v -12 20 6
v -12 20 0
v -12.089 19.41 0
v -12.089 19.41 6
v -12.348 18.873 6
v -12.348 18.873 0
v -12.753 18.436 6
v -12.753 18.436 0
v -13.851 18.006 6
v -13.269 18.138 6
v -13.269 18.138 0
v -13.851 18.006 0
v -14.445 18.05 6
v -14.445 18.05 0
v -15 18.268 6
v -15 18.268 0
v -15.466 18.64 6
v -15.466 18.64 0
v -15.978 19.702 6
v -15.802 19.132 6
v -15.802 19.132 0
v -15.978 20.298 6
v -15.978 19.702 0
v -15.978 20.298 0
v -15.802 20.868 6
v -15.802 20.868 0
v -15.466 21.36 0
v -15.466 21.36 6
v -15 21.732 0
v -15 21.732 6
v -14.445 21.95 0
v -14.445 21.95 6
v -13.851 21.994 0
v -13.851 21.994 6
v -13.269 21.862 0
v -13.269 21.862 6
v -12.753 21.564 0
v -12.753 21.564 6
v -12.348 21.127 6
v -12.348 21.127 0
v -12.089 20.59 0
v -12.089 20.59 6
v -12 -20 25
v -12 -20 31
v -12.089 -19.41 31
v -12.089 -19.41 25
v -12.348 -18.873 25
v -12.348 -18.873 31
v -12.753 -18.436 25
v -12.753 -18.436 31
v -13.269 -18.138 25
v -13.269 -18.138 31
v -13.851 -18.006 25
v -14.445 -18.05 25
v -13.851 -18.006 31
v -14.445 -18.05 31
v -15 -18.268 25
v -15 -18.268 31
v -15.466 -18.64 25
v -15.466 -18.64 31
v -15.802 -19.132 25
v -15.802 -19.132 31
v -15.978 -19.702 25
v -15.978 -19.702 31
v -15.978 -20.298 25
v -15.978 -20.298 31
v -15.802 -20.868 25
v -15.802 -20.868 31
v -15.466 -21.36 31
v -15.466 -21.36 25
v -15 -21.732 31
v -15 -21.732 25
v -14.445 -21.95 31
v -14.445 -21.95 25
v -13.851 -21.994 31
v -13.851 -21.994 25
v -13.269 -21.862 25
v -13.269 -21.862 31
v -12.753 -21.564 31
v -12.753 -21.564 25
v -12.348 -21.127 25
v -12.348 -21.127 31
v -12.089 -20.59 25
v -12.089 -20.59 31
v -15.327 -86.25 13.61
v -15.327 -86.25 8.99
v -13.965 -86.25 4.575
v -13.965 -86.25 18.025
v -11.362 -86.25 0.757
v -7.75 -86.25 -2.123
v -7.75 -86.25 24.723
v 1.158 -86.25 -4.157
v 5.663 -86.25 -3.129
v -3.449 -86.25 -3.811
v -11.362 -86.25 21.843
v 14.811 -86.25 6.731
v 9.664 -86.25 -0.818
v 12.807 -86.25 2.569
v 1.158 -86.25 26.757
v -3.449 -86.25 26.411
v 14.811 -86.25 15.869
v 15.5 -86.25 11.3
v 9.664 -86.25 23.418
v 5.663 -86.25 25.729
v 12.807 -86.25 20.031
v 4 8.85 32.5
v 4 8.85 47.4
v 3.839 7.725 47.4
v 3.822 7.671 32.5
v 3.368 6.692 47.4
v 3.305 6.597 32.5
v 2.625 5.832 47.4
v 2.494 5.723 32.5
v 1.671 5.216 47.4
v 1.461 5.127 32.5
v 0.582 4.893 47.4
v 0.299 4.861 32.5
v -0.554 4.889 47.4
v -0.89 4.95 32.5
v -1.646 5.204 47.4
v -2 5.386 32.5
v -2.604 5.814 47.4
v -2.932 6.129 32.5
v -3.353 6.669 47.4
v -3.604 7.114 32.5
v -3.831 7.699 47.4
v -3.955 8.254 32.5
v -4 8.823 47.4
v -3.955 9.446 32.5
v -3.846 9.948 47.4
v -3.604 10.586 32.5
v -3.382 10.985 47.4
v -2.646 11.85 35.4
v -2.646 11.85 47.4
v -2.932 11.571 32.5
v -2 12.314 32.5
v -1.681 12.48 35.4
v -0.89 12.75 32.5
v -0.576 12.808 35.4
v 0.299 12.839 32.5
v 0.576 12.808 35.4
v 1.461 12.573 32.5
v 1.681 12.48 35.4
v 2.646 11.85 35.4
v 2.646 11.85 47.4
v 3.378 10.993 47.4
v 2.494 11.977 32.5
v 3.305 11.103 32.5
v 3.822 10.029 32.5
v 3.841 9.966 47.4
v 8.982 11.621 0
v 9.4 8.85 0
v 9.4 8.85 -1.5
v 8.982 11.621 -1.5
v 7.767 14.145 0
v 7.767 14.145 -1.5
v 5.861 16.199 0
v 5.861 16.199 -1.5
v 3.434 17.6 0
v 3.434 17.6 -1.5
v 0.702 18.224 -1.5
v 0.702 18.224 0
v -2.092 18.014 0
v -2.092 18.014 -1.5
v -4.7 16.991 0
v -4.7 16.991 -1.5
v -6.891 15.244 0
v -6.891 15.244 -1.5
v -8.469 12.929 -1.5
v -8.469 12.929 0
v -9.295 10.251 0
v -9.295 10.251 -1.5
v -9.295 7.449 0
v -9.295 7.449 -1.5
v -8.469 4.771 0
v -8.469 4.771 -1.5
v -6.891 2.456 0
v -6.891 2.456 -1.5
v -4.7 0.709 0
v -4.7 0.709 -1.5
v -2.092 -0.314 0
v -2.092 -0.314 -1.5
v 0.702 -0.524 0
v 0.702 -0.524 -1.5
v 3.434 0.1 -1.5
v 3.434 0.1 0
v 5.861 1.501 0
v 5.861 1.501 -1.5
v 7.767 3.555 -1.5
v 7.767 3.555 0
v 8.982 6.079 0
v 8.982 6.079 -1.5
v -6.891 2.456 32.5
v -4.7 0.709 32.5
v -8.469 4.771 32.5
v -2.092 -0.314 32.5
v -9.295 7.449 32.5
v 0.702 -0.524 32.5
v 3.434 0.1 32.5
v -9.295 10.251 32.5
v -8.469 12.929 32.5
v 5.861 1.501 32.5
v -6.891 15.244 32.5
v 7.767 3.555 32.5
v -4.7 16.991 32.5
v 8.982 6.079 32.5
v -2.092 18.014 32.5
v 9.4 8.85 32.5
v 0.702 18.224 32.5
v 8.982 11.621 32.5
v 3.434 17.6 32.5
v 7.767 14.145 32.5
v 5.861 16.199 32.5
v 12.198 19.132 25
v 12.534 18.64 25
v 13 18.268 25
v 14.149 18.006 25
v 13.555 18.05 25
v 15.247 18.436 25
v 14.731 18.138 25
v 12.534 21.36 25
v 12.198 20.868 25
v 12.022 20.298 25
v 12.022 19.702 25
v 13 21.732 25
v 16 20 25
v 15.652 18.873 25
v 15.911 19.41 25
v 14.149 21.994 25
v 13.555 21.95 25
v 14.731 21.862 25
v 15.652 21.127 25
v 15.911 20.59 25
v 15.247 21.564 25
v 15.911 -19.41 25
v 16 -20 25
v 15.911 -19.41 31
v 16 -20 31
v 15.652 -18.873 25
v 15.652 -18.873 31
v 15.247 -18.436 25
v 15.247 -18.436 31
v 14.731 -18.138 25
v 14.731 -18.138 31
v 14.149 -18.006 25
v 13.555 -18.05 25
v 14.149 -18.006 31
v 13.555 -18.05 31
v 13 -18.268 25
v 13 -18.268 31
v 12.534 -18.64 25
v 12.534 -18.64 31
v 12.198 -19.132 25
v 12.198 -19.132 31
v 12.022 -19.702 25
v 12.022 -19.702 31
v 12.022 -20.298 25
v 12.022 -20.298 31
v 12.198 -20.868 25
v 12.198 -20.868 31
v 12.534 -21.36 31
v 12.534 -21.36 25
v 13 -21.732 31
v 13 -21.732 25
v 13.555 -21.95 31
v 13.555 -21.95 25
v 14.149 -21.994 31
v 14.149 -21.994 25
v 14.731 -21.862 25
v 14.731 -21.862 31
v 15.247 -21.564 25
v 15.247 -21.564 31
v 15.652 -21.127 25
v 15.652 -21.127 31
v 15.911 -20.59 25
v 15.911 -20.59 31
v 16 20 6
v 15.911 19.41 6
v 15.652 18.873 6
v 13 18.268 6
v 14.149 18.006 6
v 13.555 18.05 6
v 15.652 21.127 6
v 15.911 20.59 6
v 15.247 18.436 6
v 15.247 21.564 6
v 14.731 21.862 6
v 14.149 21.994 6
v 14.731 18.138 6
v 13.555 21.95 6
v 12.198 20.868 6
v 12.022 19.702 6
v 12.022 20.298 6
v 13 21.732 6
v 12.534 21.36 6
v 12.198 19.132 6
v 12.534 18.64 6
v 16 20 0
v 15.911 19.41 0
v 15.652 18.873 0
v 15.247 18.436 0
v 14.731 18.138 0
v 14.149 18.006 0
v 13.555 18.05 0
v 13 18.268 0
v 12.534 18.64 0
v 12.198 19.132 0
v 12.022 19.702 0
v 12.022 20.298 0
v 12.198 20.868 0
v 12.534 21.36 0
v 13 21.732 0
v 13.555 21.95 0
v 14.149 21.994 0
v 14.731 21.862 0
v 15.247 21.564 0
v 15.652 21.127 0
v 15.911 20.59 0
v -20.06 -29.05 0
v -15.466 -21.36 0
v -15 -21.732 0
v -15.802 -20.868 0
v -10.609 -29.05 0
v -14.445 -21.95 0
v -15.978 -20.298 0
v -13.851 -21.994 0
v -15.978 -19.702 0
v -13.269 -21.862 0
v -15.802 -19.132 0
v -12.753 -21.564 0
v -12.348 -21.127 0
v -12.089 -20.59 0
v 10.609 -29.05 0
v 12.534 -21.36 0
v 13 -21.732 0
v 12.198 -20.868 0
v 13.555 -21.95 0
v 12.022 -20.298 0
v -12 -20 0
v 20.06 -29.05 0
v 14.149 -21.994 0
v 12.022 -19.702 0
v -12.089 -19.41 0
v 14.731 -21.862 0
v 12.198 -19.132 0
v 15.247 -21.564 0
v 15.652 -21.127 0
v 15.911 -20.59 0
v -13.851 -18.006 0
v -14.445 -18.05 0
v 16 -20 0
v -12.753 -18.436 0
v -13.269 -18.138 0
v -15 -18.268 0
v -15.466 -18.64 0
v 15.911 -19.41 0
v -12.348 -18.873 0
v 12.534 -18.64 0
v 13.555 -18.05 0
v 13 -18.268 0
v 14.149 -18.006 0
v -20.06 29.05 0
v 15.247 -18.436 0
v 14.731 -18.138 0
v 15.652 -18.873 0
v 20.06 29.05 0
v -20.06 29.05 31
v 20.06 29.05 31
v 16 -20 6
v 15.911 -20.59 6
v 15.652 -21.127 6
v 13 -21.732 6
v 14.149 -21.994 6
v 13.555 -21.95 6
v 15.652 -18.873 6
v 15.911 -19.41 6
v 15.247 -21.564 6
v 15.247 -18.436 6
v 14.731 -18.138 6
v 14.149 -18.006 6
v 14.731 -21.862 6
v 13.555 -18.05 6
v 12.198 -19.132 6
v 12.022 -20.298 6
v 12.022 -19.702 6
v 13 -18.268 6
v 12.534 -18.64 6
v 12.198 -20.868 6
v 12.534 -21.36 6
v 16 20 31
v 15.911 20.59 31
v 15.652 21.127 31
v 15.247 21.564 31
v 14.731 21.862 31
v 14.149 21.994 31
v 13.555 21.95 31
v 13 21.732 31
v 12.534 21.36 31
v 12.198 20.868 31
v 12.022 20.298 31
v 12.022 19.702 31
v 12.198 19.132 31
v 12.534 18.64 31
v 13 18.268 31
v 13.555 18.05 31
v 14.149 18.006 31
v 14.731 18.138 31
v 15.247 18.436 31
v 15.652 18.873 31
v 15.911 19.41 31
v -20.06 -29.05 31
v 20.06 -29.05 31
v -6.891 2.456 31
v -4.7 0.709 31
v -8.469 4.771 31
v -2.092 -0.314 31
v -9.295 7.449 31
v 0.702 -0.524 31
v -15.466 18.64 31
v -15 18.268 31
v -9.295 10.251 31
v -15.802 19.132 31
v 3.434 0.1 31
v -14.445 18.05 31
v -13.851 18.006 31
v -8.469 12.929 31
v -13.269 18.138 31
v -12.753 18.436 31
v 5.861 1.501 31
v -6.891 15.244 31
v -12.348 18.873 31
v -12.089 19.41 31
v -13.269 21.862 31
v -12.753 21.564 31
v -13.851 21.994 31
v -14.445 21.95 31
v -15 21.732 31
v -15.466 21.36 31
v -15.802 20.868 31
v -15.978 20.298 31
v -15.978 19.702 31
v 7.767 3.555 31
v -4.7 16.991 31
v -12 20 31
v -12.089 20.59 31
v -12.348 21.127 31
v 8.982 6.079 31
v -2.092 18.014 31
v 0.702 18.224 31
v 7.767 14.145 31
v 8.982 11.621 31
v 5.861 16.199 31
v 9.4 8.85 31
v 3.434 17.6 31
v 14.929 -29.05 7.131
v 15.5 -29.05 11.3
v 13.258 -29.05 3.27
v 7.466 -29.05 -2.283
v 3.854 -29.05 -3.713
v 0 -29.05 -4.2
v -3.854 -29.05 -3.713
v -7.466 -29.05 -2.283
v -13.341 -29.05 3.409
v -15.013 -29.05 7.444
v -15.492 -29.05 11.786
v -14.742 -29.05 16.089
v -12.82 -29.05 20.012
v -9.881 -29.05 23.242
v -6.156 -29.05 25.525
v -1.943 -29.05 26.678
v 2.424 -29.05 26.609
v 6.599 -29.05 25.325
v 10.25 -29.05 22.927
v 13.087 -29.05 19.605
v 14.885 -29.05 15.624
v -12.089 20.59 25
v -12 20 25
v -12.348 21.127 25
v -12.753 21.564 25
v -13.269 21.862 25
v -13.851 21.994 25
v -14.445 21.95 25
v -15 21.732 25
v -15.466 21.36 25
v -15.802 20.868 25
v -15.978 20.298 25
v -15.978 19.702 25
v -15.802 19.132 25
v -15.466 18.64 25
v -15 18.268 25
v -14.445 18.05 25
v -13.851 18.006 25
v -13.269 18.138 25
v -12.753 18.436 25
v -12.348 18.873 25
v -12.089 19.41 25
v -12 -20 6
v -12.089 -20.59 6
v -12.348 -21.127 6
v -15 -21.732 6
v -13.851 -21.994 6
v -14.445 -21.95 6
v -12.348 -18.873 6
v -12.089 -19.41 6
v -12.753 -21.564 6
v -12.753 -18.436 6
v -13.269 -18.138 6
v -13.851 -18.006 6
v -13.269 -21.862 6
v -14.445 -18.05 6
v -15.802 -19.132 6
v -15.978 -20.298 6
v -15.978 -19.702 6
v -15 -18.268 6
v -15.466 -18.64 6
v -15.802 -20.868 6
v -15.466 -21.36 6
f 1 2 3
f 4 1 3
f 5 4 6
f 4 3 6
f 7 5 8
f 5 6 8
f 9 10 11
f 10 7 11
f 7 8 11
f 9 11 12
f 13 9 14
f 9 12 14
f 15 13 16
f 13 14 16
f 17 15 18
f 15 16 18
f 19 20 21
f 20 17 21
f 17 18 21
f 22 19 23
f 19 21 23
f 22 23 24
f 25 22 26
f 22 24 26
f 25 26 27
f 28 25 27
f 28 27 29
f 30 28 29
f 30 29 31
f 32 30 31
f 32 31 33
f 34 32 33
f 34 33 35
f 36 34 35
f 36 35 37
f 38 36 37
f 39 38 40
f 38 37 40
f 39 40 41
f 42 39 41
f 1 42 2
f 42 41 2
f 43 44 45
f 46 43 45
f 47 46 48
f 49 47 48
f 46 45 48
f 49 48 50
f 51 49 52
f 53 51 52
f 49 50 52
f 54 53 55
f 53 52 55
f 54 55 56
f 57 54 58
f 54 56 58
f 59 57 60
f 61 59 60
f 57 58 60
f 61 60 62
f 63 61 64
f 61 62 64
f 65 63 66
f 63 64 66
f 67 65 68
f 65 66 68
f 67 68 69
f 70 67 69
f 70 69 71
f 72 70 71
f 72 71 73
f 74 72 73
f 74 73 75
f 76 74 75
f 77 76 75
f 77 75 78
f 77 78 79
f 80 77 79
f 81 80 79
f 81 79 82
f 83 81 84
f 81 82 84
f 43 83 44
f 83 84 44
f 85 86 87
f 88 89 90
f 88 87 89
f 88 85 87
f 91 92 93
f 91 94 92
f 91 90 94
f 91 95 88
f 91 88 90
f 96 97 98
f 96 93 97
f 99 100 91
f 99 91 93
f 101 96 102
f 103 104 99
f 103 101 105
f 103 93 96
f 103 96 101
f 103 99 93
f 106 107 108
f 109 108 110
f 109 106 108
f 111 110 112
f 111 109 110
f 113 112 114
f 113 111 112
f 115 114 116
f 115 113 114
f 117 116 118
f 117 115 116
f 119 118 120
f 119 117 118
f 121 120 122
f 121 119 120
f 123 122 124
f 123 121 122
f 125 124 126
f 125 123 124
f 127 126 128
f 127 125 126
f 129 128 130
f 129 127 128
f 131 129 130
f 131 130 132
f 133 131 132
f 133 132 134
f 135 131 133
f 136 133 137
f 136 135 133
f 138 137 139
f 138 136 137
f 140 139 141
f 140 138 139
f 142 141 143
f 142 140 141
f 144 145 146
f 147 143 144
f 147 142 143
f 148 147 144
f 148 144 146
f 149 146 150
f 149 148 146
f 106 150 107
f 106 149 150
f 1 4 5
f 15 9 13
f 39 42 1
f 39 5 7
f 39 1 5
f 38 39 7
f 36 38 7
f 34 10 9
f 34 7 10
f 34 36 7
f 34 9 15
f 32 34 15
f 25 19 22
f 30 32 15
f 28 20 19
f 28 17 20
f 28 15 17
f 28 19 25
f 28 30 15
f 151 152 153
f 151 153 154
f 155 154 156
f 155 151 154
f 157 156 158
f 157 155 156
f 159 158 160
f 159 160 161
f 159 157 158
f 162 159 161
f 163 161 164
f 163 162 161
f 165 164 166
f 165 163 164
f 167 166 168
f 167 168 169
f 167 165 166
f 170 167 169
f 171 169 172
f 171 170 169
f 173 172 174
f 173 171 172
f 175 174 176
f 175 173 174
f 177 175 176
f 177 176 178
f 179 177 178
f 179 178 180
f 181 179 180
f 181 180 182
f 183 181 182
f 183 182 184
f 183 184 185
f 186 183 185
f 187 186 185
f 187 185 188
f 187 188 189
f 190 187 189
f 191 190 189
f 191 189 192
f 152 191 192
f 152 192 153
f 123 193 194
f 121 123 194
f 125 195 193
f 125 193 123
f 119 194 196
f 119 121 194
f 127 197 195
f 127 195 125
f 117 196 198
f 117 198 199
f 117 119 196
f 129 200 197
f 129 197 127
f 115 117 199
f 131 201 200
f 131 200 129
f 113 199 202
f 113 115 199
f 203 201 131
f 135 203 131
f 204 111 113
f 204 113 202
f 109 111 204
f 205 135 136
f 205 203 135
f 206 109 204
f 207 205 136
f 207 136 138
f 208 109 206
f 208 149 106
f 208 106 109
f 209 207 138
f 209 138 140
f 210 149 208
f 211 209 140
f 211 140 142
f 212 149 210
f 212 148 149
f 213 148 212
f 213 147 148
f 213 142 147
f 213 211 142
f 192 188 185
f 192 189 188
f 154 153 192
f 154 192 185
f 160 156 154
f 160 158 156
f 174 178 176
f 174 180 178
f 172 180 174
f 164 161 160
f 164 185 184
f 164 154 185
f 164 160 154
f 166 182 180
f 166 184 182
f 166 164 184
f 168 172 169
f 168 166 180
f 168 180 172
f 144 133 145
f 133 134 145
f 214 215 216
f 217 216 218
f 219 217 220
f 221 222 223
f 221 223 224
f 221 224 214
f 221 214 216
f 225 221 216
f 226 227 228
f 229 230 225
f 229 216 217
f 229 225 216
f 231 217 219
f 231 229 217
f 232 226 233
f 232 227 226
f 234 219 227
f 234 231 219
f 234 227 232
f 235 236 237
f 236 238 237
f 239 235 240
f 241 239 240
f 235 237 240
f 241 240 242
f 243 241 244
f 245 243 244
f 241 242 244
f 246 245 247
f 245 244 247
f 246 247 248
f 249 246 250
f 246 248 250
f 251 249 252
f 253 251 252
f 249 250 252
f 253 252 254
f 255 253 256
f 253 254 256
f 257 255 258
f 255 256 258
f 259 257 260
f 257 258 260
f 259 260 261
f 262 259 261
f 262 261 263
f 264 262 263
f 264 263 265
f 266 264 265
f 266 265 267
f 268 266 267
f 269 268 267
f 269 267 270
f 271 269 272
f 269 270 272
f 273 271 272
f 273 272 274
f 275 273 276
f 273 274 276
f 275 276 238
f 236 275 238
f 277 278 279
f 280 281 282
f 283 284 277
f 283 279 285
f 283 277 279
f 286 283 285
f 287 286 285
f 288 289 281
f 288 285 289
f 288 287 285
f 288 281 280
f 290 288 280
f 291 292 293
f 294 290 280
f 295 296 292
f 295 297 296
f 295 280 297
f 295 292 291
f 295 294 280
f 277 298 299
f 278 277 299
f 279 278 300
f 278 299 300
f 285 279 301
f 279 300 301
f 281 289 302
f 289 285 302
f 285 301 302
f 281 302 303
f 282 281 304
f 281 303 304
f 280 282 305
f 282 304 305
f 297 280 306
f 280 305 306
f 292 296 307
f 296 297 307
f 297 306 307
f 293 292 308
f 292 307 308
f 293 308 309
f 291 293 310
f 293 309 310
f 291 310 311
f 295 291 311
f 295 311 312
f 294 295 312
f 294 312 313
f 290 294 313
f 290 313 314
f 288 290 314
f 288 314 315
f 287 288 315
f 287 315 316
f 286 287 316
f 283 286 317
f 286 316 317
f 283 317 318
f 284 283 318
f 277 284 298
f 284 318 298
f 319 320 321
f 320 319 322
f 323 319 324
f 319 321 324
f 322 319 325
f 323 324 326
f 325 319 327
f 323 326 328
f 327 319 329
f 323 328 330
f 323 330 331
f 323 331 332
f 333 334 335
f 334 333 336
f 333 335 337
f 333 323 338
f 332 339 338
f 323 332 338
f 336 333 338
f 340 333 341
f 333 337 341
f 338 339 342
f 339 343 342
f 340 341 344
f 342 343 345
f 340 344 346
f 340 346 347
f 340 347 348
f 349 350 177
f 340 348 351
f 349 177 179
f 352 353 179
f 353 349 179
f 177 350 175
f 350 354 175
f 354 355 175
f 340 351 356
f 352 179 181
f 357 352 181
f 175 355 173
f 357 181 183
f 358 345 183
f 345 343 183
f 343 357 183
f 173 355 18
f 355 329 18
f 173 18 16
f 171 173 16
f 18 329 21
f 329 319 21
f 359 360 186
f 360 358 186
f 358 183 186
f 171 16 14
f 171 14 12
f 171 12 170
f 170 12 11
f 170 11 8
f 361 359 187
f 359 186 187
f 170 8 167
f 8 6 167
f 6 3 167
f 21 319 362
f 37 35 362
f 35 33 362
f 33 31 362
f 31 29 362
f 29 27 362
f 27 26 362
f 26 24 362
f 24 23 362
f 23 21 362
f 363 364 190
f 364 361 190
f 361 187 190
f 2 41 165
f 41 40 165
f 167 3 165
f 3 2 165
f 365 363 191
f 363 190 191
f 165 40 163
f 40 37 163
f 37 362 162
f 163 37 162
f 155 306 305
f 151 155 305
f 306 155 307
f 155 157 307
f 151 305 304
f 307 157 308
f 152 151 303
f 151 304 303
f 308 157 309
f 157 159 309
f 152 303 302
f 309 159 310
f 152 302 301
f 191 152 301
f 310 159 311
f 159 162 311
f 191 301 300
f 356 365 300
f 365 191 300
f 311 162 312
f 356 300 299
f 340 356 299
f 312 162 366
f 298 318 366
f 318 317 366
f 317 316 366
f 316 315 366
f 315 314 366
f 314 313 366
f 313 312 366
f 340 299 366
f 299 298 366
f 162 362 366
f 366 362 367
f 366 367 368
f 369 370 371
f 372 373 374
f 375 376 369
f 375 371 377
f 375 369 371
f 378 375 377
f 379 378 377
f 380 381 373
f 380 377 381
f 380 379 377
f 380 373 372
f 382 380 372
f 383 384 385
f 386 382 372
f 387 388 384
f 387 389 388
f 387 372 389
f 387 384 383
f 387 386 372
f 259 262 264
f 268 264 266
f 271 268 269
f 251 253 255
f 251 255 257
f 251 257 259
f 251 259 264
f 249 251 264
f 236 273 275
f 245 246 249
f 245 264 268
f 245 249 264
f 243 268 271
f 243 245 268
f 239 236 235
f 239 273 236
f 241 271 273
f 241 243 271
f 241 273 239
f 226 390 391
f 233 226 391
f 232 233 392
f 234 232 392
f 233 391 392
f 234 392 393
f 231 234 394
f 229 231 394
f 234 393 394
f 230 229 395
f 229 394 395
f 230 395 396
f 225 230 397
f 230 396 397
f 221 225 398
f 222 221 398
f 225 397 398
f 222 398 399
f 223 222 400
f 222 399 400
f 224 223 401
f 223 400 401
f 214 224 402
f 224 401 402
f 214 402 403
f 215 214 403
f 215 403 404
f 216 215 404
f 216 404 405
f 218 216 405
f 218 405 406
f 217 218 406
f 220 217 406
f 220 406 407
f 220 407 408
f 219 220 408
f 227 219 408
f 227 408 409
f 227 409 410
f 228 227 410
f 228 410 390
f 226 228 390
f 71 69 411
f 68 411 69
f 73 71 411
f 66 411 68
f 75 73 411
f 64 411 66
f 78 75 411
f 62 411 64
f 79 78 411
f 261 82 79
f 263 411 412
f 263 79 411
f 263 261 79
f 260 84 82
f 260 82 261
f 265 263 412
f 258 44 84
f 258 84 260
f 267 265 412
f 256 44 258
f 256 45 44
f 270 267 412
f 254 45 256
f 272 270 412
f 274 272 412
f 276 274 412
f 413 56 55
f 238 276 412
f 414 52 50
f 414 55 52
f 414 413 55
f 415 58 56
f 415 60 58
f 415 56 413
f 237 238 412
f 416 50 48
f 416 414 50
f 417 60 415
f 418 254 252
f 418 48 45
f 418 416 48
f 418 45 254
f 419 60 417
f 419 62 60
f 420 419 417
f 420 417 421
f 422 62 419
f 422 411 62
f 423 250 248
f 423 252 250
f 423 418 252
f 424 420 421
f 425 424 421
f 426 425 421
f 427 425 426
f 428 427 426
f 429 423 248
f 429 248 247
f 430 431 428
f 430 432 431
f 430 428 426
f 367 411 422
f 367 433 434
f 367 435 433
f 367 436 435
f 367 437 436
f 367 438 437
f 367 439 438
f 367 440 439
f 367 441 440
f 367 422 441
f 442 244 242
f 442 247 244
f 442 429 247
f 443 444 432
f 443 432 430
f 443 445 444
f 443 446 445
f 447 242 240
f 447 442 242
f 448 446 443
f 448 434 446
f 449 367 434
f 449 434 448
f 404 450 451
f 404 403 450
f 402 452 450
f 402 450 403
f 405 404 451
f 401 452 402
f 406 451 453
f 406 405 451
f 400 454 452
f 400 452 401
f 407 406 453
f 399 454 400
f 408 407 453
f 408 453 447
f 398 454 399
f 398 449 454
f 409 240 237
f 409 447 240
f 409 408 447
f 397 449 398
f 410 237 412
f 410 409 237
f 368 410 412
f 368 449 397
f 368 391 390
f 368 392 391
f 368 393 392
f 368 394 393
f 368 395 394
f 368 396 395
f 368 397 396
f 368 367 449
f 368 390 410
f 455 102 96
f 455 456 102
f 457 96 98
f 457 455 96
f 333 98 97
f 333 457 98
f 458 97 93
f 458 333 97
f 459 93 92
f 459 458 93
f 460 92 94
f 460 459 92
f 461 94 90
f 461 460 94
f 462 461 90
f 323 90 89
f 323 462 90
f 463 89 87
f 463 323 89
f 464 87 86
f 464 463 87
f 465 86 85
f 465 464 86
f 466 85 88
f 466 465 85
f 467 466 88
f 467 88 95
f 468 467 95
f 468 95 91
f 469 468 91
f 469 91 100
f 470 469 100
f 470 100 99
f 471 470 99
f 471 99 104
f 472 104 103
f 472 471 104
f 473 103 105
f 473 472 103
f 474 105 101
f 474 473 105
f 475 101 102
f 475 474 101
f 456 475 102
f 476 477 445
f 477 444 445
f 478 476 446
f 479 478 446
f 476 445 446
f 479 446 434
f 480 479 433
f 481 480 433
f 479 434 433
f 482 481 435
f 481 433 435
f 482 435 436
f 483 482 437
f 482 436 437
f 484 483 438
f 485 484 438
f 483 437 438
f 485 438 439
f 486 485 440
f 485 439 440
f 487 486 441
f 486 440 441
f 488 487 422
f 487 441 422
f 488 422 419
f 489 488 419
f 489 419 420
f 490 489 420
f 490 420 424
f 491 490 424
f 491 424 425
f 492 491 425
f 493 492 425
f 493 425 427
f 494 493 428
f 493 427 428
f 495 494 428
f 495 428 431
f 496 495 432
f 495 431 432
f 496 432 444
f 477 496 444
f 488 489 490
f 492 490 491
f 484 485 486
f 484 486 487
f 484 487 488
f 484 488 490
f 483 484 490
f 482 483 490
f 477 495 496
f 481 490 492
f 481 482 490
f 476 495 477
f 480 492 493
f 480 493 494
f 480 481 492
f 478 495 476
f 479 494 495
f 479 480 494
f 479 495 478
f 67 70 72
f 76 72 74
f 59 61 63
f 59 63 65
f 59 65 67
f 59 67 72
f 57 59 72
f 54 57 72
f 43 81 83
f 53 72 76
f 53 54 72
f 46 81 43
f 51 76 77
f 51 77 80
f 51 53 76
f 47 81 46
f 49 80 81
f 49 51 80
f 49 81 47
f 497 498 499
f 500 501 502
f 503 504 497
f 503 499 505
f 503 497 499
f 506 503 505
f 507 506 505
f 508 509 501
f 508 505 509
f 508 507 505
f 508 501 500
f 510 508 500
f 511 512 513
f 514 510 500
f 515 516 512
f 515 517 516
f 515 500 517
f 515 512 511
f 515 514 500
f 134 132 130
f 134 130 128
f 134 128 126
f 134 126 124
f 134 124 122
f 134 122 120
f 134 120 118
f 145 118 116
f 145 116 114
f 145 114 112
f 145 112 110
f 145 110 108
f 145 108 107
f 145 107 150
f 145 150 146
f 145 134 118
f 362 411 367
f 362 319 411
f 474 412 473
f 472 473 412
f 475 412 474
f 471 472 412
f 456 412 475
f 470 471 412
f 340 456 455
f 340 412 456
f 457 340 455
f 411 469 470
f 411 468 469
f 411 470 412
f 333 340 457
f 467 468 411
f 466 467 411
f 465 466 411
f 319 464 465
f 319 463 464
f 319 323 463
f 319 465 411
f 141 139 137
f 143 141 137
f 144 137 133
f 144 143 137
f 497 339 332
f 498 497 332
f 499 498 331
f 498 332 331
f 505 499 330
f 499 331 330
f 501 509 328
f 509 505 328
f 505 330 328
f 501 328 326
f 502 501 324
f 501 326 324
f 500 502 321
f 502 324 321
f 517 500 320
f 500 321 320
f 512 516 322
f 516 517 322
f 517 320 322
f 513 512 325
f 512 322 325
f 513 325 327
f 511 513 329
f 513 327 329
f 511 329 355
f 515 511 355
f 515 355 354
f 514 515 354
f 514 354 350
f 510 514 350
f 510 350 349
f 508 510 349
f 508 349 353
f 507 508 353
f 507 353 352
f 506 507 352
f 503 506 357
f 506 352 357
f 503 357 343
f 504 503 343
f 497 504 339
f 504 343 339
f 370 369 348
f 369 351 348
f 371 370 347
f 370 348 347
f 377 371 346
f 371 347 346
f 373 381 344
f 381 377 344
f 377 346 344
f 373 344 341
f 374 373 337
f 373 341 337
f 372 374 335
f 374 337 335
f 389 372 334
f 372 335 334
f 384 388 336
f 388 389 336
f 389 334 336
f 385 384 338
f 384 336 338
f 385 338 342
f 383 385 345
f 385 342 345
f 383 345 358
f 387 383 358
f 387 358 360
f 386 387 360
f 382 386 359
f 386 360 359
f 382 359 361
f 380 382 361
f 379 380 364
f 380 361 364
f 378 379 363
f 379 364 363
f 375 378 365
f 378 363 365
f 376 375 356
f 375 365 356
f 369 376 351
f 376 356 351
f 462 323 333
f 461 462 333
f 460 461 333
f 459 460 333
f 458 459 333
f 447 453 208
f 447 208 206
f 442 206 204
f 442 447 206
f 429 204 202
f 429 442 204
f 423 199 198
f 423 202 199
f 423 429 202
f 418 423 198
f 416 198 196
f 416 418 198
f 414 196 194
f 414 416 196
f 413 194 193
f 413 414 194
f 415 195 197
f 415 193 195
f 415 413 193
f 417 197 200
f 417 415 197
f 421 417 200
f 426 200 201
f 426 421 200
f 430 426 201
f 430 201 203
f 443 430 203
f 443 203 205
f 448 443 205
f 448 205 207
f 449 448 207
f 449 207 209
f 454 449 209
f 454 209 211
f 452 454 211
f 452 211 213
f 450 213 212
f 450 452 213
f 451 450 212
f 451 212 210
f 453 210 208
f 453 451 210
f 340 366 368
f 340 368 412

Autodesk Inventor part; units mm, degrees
ref_plane "YZ Plane" through (0, 0, 0) normal (1, 0, 0) x (0, 1, 0)
ref_plane "XZ Plane" through (0, 0, 0) normal (0, 1, 0) x (-1, 0, 0)
sketch "Sketch1" plane through (0, 0, 0) normal (0, 0, 1) x (1, 0, 0)
  line L0 (20.06, -29.05) -> (-20.06, -29.05)
  line L1 (-20.06, -29.05) -> (-20.06, 29.05)
  line L2 (-20.06, 29.05) -> (20.06, 29.05)
  line L3 (20.06, 29.05) -> (20.06, -29.05)
  line L4 (20.06, -29.05) -> (-20.06, 29.05) construction
  line L5 (-20.06, -29.05) -> (20.06, 29.05) construction
  point P0 (0, 0)
  dimension "d0" = 40.12
  dimension "d1" = 58.1
extrude "Extrusion1" add sketch "Sketch1" along normal blind 31
sketch "Sketch2" plane through (0, 0, 31) normal (0, 0, 1) x (1, 0, 0)
  line L0 (0, 0) -> (0, 8.85) construction
  circle A0 centre (0, 8.85) radius 9.4
  line L1 (-20.06, -29.05) -> (20.06, -29.05) projected
  dimension "d4" = 18.8
  dimension "d5" = 37.9
extrude "Extrusion2" add sketch "Sketch2" along normal blind 1.5
sketch "Sketch3" plane through (0, 8.85, 32.5) normal (0, 0, 1) x (1, 0, 0)
  circle A0 centre (0, 0) radius 9.4 projected
  circle A1 centre (0, 0) radius 4
  point P0 (0, -8.85)
  dimension "d8" = 8
extrude "Extrusion3" add sketch "Sketch3" along normal blind 14.9 contours A1
sketch "Sketch4" plane through (0, 8.85, 47.4) normal (0, 0, 1) x (1, 0, 0)
  circle A0 centre (0, 0) radius 4 construction
  arc A1 (2.6458, 3) -> (-2.6458, 3) centre (0, 0) ccw
  line L0 (-2.6458, 3) -> (2.6458, 3)
  point P0 (0, -8.85)
  dimension "d11" = 7
extrude "Extrusion4" cut sketch "Sketch4" against normal blind 12
sketch "Sketch5" plane through (0, 0, 31) normal (0, 0, 1) x (1, 0, 0)
  circle A0 centre (0, 8.85) radius 9.4 construction
  line L0 (-20.06, -29.05) -> (20.06, -29.05) construction
  line L1 (20.06, -29.05) -> (20.06, 29.05) construction
  line L2 (20.06, 29.05) -> (-20.06, 29.05) construction
  line L3 (-20.06, 29.05) -> (-20.06, -29.05) construction
  line L4 (0, 29.05) -> (0, -29.05) construction
  line L5 (-20.06, -29.05) -> (20.06, -29.05) construction
  line L6 (14, -20) -> (-14, -20) construction
  line L7 (-14, -20) -> (-14, 20) construction
  line L8 (-14, 20) -> (14, 20) construction
  line L9 (14, 20) -> (14, -20) construction
  line L10 (14, -20) -> (-14, 20) construction
  line L11 (-14, -20) -> (14, 20) construction
  circle A1 centre (-14, 20) radius 2
  circle A2 centre (14, 20) radius 2
  circle A3 centre (14, -20) radius 2
  circle A4 centre (-14, -20) radius 2
  point P0 (0, 0)
  dimension "d14" = 28
  dimension "d15" = 40
  dimension "d16" = 4
extrude "Extrusion5" cut sketch "Sketch5" against normal blind 6
ref_plane "Work Plane1" through (0, 0, 15.5) normal (0, 0, 1) x (1, 0, 0)
mirror "Mirror1" about plane through (0, 0, 15.5) normal (0, 0, 1) of "Extrusion5", "Extrusion2"
sketch "Sketch6" plane through (-20.06, -29.05, 0) normal (0, -1, 0) x (1, 0, 0)
  line L0 (20.06, 0) -> (20.06, 11.3) construction
  circle A0 centre (20.06, 11.3) radius 15.5
  line L1 (40.12, 0) -> (0, 0) projected
  point P0 (20.06, -4.2)
  dimension "d19" = 31
  dimension "d20" = 4.2
extrude "Extrusion6" add sketch "Sketch6" along normal blind 57.2
properties part number "motor"
